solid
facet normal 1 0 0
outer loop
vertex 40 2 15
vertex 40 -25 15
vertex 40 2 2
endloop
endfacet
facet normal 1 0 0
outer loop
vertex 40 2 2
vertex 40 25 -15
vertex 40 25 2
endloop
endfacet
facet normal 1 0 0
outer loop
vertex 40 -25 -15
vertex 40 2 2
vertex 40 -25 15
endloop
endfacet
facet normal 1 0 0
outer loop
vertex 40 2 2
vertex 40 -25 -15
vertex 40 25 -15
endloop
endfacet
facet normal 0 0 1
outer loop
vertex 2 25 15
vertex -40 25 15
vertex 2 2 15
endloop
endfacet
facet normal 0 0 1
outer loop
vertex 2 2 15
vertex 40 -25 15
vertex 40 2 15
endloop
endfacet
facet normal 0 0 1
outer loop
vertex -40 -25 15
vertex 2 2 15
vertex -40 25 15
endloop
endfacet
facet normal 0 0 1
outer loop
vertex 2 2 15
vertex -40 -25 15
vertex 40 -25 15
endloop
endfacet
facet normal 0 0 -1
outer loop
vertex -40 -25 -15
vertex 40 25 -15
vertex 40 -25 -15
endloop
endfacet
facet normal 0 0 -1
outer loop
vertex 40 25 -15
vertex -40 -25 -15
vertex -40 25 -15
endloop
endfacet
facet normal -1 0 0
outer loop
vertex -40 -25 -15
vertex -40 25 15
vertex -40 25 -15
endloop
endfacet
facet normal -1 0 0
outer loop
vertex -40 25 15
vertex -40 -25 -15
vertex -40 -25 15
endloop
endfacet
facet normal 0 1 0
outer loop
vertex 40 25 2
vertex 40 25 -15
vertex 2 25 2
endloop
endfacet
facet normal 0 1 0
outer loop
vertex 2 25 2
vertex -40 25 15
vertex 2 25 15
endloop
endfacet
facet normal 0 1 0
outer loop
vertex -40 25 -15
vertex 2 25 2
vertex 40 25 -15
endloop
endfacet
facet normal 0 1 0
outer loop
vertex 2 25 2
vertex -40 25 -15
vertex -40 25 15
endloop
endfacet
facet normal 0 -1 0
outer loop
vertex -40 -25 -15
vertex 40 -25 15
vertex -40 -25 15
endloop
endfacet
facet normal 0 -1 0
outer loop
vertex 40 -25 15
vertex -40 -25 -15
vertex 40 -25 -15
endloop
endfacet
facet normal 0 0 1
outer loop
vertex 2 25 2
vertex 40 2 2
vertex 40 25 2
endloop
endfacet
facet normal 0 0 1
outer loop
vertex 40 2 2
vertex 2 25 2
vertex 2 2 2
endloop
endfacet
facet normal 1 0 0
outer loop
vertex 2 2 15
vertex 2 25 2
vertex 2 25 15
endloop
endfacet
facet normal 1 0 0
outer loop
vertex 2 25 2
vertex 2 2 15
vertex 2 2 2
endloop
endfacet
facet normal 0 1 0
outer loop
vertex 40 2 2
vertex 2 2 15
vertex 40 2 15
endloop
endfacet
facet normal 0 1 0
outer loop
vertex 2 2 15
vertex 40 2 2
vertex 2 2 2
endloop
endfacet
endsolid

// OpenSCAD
// Parametric Box
length = 80;
width = 50;
height = 30;
wall_thickness = 2;

module parametric_box(l, w, h, t) {
    difference() {
        cube([l, w, h], center = true);
        translate([t, t, t])
            cube([l - 2*t, w - 2*t, h - 2*t]);
    }
}

parametric_box(length, width, height, wall_thickness);
